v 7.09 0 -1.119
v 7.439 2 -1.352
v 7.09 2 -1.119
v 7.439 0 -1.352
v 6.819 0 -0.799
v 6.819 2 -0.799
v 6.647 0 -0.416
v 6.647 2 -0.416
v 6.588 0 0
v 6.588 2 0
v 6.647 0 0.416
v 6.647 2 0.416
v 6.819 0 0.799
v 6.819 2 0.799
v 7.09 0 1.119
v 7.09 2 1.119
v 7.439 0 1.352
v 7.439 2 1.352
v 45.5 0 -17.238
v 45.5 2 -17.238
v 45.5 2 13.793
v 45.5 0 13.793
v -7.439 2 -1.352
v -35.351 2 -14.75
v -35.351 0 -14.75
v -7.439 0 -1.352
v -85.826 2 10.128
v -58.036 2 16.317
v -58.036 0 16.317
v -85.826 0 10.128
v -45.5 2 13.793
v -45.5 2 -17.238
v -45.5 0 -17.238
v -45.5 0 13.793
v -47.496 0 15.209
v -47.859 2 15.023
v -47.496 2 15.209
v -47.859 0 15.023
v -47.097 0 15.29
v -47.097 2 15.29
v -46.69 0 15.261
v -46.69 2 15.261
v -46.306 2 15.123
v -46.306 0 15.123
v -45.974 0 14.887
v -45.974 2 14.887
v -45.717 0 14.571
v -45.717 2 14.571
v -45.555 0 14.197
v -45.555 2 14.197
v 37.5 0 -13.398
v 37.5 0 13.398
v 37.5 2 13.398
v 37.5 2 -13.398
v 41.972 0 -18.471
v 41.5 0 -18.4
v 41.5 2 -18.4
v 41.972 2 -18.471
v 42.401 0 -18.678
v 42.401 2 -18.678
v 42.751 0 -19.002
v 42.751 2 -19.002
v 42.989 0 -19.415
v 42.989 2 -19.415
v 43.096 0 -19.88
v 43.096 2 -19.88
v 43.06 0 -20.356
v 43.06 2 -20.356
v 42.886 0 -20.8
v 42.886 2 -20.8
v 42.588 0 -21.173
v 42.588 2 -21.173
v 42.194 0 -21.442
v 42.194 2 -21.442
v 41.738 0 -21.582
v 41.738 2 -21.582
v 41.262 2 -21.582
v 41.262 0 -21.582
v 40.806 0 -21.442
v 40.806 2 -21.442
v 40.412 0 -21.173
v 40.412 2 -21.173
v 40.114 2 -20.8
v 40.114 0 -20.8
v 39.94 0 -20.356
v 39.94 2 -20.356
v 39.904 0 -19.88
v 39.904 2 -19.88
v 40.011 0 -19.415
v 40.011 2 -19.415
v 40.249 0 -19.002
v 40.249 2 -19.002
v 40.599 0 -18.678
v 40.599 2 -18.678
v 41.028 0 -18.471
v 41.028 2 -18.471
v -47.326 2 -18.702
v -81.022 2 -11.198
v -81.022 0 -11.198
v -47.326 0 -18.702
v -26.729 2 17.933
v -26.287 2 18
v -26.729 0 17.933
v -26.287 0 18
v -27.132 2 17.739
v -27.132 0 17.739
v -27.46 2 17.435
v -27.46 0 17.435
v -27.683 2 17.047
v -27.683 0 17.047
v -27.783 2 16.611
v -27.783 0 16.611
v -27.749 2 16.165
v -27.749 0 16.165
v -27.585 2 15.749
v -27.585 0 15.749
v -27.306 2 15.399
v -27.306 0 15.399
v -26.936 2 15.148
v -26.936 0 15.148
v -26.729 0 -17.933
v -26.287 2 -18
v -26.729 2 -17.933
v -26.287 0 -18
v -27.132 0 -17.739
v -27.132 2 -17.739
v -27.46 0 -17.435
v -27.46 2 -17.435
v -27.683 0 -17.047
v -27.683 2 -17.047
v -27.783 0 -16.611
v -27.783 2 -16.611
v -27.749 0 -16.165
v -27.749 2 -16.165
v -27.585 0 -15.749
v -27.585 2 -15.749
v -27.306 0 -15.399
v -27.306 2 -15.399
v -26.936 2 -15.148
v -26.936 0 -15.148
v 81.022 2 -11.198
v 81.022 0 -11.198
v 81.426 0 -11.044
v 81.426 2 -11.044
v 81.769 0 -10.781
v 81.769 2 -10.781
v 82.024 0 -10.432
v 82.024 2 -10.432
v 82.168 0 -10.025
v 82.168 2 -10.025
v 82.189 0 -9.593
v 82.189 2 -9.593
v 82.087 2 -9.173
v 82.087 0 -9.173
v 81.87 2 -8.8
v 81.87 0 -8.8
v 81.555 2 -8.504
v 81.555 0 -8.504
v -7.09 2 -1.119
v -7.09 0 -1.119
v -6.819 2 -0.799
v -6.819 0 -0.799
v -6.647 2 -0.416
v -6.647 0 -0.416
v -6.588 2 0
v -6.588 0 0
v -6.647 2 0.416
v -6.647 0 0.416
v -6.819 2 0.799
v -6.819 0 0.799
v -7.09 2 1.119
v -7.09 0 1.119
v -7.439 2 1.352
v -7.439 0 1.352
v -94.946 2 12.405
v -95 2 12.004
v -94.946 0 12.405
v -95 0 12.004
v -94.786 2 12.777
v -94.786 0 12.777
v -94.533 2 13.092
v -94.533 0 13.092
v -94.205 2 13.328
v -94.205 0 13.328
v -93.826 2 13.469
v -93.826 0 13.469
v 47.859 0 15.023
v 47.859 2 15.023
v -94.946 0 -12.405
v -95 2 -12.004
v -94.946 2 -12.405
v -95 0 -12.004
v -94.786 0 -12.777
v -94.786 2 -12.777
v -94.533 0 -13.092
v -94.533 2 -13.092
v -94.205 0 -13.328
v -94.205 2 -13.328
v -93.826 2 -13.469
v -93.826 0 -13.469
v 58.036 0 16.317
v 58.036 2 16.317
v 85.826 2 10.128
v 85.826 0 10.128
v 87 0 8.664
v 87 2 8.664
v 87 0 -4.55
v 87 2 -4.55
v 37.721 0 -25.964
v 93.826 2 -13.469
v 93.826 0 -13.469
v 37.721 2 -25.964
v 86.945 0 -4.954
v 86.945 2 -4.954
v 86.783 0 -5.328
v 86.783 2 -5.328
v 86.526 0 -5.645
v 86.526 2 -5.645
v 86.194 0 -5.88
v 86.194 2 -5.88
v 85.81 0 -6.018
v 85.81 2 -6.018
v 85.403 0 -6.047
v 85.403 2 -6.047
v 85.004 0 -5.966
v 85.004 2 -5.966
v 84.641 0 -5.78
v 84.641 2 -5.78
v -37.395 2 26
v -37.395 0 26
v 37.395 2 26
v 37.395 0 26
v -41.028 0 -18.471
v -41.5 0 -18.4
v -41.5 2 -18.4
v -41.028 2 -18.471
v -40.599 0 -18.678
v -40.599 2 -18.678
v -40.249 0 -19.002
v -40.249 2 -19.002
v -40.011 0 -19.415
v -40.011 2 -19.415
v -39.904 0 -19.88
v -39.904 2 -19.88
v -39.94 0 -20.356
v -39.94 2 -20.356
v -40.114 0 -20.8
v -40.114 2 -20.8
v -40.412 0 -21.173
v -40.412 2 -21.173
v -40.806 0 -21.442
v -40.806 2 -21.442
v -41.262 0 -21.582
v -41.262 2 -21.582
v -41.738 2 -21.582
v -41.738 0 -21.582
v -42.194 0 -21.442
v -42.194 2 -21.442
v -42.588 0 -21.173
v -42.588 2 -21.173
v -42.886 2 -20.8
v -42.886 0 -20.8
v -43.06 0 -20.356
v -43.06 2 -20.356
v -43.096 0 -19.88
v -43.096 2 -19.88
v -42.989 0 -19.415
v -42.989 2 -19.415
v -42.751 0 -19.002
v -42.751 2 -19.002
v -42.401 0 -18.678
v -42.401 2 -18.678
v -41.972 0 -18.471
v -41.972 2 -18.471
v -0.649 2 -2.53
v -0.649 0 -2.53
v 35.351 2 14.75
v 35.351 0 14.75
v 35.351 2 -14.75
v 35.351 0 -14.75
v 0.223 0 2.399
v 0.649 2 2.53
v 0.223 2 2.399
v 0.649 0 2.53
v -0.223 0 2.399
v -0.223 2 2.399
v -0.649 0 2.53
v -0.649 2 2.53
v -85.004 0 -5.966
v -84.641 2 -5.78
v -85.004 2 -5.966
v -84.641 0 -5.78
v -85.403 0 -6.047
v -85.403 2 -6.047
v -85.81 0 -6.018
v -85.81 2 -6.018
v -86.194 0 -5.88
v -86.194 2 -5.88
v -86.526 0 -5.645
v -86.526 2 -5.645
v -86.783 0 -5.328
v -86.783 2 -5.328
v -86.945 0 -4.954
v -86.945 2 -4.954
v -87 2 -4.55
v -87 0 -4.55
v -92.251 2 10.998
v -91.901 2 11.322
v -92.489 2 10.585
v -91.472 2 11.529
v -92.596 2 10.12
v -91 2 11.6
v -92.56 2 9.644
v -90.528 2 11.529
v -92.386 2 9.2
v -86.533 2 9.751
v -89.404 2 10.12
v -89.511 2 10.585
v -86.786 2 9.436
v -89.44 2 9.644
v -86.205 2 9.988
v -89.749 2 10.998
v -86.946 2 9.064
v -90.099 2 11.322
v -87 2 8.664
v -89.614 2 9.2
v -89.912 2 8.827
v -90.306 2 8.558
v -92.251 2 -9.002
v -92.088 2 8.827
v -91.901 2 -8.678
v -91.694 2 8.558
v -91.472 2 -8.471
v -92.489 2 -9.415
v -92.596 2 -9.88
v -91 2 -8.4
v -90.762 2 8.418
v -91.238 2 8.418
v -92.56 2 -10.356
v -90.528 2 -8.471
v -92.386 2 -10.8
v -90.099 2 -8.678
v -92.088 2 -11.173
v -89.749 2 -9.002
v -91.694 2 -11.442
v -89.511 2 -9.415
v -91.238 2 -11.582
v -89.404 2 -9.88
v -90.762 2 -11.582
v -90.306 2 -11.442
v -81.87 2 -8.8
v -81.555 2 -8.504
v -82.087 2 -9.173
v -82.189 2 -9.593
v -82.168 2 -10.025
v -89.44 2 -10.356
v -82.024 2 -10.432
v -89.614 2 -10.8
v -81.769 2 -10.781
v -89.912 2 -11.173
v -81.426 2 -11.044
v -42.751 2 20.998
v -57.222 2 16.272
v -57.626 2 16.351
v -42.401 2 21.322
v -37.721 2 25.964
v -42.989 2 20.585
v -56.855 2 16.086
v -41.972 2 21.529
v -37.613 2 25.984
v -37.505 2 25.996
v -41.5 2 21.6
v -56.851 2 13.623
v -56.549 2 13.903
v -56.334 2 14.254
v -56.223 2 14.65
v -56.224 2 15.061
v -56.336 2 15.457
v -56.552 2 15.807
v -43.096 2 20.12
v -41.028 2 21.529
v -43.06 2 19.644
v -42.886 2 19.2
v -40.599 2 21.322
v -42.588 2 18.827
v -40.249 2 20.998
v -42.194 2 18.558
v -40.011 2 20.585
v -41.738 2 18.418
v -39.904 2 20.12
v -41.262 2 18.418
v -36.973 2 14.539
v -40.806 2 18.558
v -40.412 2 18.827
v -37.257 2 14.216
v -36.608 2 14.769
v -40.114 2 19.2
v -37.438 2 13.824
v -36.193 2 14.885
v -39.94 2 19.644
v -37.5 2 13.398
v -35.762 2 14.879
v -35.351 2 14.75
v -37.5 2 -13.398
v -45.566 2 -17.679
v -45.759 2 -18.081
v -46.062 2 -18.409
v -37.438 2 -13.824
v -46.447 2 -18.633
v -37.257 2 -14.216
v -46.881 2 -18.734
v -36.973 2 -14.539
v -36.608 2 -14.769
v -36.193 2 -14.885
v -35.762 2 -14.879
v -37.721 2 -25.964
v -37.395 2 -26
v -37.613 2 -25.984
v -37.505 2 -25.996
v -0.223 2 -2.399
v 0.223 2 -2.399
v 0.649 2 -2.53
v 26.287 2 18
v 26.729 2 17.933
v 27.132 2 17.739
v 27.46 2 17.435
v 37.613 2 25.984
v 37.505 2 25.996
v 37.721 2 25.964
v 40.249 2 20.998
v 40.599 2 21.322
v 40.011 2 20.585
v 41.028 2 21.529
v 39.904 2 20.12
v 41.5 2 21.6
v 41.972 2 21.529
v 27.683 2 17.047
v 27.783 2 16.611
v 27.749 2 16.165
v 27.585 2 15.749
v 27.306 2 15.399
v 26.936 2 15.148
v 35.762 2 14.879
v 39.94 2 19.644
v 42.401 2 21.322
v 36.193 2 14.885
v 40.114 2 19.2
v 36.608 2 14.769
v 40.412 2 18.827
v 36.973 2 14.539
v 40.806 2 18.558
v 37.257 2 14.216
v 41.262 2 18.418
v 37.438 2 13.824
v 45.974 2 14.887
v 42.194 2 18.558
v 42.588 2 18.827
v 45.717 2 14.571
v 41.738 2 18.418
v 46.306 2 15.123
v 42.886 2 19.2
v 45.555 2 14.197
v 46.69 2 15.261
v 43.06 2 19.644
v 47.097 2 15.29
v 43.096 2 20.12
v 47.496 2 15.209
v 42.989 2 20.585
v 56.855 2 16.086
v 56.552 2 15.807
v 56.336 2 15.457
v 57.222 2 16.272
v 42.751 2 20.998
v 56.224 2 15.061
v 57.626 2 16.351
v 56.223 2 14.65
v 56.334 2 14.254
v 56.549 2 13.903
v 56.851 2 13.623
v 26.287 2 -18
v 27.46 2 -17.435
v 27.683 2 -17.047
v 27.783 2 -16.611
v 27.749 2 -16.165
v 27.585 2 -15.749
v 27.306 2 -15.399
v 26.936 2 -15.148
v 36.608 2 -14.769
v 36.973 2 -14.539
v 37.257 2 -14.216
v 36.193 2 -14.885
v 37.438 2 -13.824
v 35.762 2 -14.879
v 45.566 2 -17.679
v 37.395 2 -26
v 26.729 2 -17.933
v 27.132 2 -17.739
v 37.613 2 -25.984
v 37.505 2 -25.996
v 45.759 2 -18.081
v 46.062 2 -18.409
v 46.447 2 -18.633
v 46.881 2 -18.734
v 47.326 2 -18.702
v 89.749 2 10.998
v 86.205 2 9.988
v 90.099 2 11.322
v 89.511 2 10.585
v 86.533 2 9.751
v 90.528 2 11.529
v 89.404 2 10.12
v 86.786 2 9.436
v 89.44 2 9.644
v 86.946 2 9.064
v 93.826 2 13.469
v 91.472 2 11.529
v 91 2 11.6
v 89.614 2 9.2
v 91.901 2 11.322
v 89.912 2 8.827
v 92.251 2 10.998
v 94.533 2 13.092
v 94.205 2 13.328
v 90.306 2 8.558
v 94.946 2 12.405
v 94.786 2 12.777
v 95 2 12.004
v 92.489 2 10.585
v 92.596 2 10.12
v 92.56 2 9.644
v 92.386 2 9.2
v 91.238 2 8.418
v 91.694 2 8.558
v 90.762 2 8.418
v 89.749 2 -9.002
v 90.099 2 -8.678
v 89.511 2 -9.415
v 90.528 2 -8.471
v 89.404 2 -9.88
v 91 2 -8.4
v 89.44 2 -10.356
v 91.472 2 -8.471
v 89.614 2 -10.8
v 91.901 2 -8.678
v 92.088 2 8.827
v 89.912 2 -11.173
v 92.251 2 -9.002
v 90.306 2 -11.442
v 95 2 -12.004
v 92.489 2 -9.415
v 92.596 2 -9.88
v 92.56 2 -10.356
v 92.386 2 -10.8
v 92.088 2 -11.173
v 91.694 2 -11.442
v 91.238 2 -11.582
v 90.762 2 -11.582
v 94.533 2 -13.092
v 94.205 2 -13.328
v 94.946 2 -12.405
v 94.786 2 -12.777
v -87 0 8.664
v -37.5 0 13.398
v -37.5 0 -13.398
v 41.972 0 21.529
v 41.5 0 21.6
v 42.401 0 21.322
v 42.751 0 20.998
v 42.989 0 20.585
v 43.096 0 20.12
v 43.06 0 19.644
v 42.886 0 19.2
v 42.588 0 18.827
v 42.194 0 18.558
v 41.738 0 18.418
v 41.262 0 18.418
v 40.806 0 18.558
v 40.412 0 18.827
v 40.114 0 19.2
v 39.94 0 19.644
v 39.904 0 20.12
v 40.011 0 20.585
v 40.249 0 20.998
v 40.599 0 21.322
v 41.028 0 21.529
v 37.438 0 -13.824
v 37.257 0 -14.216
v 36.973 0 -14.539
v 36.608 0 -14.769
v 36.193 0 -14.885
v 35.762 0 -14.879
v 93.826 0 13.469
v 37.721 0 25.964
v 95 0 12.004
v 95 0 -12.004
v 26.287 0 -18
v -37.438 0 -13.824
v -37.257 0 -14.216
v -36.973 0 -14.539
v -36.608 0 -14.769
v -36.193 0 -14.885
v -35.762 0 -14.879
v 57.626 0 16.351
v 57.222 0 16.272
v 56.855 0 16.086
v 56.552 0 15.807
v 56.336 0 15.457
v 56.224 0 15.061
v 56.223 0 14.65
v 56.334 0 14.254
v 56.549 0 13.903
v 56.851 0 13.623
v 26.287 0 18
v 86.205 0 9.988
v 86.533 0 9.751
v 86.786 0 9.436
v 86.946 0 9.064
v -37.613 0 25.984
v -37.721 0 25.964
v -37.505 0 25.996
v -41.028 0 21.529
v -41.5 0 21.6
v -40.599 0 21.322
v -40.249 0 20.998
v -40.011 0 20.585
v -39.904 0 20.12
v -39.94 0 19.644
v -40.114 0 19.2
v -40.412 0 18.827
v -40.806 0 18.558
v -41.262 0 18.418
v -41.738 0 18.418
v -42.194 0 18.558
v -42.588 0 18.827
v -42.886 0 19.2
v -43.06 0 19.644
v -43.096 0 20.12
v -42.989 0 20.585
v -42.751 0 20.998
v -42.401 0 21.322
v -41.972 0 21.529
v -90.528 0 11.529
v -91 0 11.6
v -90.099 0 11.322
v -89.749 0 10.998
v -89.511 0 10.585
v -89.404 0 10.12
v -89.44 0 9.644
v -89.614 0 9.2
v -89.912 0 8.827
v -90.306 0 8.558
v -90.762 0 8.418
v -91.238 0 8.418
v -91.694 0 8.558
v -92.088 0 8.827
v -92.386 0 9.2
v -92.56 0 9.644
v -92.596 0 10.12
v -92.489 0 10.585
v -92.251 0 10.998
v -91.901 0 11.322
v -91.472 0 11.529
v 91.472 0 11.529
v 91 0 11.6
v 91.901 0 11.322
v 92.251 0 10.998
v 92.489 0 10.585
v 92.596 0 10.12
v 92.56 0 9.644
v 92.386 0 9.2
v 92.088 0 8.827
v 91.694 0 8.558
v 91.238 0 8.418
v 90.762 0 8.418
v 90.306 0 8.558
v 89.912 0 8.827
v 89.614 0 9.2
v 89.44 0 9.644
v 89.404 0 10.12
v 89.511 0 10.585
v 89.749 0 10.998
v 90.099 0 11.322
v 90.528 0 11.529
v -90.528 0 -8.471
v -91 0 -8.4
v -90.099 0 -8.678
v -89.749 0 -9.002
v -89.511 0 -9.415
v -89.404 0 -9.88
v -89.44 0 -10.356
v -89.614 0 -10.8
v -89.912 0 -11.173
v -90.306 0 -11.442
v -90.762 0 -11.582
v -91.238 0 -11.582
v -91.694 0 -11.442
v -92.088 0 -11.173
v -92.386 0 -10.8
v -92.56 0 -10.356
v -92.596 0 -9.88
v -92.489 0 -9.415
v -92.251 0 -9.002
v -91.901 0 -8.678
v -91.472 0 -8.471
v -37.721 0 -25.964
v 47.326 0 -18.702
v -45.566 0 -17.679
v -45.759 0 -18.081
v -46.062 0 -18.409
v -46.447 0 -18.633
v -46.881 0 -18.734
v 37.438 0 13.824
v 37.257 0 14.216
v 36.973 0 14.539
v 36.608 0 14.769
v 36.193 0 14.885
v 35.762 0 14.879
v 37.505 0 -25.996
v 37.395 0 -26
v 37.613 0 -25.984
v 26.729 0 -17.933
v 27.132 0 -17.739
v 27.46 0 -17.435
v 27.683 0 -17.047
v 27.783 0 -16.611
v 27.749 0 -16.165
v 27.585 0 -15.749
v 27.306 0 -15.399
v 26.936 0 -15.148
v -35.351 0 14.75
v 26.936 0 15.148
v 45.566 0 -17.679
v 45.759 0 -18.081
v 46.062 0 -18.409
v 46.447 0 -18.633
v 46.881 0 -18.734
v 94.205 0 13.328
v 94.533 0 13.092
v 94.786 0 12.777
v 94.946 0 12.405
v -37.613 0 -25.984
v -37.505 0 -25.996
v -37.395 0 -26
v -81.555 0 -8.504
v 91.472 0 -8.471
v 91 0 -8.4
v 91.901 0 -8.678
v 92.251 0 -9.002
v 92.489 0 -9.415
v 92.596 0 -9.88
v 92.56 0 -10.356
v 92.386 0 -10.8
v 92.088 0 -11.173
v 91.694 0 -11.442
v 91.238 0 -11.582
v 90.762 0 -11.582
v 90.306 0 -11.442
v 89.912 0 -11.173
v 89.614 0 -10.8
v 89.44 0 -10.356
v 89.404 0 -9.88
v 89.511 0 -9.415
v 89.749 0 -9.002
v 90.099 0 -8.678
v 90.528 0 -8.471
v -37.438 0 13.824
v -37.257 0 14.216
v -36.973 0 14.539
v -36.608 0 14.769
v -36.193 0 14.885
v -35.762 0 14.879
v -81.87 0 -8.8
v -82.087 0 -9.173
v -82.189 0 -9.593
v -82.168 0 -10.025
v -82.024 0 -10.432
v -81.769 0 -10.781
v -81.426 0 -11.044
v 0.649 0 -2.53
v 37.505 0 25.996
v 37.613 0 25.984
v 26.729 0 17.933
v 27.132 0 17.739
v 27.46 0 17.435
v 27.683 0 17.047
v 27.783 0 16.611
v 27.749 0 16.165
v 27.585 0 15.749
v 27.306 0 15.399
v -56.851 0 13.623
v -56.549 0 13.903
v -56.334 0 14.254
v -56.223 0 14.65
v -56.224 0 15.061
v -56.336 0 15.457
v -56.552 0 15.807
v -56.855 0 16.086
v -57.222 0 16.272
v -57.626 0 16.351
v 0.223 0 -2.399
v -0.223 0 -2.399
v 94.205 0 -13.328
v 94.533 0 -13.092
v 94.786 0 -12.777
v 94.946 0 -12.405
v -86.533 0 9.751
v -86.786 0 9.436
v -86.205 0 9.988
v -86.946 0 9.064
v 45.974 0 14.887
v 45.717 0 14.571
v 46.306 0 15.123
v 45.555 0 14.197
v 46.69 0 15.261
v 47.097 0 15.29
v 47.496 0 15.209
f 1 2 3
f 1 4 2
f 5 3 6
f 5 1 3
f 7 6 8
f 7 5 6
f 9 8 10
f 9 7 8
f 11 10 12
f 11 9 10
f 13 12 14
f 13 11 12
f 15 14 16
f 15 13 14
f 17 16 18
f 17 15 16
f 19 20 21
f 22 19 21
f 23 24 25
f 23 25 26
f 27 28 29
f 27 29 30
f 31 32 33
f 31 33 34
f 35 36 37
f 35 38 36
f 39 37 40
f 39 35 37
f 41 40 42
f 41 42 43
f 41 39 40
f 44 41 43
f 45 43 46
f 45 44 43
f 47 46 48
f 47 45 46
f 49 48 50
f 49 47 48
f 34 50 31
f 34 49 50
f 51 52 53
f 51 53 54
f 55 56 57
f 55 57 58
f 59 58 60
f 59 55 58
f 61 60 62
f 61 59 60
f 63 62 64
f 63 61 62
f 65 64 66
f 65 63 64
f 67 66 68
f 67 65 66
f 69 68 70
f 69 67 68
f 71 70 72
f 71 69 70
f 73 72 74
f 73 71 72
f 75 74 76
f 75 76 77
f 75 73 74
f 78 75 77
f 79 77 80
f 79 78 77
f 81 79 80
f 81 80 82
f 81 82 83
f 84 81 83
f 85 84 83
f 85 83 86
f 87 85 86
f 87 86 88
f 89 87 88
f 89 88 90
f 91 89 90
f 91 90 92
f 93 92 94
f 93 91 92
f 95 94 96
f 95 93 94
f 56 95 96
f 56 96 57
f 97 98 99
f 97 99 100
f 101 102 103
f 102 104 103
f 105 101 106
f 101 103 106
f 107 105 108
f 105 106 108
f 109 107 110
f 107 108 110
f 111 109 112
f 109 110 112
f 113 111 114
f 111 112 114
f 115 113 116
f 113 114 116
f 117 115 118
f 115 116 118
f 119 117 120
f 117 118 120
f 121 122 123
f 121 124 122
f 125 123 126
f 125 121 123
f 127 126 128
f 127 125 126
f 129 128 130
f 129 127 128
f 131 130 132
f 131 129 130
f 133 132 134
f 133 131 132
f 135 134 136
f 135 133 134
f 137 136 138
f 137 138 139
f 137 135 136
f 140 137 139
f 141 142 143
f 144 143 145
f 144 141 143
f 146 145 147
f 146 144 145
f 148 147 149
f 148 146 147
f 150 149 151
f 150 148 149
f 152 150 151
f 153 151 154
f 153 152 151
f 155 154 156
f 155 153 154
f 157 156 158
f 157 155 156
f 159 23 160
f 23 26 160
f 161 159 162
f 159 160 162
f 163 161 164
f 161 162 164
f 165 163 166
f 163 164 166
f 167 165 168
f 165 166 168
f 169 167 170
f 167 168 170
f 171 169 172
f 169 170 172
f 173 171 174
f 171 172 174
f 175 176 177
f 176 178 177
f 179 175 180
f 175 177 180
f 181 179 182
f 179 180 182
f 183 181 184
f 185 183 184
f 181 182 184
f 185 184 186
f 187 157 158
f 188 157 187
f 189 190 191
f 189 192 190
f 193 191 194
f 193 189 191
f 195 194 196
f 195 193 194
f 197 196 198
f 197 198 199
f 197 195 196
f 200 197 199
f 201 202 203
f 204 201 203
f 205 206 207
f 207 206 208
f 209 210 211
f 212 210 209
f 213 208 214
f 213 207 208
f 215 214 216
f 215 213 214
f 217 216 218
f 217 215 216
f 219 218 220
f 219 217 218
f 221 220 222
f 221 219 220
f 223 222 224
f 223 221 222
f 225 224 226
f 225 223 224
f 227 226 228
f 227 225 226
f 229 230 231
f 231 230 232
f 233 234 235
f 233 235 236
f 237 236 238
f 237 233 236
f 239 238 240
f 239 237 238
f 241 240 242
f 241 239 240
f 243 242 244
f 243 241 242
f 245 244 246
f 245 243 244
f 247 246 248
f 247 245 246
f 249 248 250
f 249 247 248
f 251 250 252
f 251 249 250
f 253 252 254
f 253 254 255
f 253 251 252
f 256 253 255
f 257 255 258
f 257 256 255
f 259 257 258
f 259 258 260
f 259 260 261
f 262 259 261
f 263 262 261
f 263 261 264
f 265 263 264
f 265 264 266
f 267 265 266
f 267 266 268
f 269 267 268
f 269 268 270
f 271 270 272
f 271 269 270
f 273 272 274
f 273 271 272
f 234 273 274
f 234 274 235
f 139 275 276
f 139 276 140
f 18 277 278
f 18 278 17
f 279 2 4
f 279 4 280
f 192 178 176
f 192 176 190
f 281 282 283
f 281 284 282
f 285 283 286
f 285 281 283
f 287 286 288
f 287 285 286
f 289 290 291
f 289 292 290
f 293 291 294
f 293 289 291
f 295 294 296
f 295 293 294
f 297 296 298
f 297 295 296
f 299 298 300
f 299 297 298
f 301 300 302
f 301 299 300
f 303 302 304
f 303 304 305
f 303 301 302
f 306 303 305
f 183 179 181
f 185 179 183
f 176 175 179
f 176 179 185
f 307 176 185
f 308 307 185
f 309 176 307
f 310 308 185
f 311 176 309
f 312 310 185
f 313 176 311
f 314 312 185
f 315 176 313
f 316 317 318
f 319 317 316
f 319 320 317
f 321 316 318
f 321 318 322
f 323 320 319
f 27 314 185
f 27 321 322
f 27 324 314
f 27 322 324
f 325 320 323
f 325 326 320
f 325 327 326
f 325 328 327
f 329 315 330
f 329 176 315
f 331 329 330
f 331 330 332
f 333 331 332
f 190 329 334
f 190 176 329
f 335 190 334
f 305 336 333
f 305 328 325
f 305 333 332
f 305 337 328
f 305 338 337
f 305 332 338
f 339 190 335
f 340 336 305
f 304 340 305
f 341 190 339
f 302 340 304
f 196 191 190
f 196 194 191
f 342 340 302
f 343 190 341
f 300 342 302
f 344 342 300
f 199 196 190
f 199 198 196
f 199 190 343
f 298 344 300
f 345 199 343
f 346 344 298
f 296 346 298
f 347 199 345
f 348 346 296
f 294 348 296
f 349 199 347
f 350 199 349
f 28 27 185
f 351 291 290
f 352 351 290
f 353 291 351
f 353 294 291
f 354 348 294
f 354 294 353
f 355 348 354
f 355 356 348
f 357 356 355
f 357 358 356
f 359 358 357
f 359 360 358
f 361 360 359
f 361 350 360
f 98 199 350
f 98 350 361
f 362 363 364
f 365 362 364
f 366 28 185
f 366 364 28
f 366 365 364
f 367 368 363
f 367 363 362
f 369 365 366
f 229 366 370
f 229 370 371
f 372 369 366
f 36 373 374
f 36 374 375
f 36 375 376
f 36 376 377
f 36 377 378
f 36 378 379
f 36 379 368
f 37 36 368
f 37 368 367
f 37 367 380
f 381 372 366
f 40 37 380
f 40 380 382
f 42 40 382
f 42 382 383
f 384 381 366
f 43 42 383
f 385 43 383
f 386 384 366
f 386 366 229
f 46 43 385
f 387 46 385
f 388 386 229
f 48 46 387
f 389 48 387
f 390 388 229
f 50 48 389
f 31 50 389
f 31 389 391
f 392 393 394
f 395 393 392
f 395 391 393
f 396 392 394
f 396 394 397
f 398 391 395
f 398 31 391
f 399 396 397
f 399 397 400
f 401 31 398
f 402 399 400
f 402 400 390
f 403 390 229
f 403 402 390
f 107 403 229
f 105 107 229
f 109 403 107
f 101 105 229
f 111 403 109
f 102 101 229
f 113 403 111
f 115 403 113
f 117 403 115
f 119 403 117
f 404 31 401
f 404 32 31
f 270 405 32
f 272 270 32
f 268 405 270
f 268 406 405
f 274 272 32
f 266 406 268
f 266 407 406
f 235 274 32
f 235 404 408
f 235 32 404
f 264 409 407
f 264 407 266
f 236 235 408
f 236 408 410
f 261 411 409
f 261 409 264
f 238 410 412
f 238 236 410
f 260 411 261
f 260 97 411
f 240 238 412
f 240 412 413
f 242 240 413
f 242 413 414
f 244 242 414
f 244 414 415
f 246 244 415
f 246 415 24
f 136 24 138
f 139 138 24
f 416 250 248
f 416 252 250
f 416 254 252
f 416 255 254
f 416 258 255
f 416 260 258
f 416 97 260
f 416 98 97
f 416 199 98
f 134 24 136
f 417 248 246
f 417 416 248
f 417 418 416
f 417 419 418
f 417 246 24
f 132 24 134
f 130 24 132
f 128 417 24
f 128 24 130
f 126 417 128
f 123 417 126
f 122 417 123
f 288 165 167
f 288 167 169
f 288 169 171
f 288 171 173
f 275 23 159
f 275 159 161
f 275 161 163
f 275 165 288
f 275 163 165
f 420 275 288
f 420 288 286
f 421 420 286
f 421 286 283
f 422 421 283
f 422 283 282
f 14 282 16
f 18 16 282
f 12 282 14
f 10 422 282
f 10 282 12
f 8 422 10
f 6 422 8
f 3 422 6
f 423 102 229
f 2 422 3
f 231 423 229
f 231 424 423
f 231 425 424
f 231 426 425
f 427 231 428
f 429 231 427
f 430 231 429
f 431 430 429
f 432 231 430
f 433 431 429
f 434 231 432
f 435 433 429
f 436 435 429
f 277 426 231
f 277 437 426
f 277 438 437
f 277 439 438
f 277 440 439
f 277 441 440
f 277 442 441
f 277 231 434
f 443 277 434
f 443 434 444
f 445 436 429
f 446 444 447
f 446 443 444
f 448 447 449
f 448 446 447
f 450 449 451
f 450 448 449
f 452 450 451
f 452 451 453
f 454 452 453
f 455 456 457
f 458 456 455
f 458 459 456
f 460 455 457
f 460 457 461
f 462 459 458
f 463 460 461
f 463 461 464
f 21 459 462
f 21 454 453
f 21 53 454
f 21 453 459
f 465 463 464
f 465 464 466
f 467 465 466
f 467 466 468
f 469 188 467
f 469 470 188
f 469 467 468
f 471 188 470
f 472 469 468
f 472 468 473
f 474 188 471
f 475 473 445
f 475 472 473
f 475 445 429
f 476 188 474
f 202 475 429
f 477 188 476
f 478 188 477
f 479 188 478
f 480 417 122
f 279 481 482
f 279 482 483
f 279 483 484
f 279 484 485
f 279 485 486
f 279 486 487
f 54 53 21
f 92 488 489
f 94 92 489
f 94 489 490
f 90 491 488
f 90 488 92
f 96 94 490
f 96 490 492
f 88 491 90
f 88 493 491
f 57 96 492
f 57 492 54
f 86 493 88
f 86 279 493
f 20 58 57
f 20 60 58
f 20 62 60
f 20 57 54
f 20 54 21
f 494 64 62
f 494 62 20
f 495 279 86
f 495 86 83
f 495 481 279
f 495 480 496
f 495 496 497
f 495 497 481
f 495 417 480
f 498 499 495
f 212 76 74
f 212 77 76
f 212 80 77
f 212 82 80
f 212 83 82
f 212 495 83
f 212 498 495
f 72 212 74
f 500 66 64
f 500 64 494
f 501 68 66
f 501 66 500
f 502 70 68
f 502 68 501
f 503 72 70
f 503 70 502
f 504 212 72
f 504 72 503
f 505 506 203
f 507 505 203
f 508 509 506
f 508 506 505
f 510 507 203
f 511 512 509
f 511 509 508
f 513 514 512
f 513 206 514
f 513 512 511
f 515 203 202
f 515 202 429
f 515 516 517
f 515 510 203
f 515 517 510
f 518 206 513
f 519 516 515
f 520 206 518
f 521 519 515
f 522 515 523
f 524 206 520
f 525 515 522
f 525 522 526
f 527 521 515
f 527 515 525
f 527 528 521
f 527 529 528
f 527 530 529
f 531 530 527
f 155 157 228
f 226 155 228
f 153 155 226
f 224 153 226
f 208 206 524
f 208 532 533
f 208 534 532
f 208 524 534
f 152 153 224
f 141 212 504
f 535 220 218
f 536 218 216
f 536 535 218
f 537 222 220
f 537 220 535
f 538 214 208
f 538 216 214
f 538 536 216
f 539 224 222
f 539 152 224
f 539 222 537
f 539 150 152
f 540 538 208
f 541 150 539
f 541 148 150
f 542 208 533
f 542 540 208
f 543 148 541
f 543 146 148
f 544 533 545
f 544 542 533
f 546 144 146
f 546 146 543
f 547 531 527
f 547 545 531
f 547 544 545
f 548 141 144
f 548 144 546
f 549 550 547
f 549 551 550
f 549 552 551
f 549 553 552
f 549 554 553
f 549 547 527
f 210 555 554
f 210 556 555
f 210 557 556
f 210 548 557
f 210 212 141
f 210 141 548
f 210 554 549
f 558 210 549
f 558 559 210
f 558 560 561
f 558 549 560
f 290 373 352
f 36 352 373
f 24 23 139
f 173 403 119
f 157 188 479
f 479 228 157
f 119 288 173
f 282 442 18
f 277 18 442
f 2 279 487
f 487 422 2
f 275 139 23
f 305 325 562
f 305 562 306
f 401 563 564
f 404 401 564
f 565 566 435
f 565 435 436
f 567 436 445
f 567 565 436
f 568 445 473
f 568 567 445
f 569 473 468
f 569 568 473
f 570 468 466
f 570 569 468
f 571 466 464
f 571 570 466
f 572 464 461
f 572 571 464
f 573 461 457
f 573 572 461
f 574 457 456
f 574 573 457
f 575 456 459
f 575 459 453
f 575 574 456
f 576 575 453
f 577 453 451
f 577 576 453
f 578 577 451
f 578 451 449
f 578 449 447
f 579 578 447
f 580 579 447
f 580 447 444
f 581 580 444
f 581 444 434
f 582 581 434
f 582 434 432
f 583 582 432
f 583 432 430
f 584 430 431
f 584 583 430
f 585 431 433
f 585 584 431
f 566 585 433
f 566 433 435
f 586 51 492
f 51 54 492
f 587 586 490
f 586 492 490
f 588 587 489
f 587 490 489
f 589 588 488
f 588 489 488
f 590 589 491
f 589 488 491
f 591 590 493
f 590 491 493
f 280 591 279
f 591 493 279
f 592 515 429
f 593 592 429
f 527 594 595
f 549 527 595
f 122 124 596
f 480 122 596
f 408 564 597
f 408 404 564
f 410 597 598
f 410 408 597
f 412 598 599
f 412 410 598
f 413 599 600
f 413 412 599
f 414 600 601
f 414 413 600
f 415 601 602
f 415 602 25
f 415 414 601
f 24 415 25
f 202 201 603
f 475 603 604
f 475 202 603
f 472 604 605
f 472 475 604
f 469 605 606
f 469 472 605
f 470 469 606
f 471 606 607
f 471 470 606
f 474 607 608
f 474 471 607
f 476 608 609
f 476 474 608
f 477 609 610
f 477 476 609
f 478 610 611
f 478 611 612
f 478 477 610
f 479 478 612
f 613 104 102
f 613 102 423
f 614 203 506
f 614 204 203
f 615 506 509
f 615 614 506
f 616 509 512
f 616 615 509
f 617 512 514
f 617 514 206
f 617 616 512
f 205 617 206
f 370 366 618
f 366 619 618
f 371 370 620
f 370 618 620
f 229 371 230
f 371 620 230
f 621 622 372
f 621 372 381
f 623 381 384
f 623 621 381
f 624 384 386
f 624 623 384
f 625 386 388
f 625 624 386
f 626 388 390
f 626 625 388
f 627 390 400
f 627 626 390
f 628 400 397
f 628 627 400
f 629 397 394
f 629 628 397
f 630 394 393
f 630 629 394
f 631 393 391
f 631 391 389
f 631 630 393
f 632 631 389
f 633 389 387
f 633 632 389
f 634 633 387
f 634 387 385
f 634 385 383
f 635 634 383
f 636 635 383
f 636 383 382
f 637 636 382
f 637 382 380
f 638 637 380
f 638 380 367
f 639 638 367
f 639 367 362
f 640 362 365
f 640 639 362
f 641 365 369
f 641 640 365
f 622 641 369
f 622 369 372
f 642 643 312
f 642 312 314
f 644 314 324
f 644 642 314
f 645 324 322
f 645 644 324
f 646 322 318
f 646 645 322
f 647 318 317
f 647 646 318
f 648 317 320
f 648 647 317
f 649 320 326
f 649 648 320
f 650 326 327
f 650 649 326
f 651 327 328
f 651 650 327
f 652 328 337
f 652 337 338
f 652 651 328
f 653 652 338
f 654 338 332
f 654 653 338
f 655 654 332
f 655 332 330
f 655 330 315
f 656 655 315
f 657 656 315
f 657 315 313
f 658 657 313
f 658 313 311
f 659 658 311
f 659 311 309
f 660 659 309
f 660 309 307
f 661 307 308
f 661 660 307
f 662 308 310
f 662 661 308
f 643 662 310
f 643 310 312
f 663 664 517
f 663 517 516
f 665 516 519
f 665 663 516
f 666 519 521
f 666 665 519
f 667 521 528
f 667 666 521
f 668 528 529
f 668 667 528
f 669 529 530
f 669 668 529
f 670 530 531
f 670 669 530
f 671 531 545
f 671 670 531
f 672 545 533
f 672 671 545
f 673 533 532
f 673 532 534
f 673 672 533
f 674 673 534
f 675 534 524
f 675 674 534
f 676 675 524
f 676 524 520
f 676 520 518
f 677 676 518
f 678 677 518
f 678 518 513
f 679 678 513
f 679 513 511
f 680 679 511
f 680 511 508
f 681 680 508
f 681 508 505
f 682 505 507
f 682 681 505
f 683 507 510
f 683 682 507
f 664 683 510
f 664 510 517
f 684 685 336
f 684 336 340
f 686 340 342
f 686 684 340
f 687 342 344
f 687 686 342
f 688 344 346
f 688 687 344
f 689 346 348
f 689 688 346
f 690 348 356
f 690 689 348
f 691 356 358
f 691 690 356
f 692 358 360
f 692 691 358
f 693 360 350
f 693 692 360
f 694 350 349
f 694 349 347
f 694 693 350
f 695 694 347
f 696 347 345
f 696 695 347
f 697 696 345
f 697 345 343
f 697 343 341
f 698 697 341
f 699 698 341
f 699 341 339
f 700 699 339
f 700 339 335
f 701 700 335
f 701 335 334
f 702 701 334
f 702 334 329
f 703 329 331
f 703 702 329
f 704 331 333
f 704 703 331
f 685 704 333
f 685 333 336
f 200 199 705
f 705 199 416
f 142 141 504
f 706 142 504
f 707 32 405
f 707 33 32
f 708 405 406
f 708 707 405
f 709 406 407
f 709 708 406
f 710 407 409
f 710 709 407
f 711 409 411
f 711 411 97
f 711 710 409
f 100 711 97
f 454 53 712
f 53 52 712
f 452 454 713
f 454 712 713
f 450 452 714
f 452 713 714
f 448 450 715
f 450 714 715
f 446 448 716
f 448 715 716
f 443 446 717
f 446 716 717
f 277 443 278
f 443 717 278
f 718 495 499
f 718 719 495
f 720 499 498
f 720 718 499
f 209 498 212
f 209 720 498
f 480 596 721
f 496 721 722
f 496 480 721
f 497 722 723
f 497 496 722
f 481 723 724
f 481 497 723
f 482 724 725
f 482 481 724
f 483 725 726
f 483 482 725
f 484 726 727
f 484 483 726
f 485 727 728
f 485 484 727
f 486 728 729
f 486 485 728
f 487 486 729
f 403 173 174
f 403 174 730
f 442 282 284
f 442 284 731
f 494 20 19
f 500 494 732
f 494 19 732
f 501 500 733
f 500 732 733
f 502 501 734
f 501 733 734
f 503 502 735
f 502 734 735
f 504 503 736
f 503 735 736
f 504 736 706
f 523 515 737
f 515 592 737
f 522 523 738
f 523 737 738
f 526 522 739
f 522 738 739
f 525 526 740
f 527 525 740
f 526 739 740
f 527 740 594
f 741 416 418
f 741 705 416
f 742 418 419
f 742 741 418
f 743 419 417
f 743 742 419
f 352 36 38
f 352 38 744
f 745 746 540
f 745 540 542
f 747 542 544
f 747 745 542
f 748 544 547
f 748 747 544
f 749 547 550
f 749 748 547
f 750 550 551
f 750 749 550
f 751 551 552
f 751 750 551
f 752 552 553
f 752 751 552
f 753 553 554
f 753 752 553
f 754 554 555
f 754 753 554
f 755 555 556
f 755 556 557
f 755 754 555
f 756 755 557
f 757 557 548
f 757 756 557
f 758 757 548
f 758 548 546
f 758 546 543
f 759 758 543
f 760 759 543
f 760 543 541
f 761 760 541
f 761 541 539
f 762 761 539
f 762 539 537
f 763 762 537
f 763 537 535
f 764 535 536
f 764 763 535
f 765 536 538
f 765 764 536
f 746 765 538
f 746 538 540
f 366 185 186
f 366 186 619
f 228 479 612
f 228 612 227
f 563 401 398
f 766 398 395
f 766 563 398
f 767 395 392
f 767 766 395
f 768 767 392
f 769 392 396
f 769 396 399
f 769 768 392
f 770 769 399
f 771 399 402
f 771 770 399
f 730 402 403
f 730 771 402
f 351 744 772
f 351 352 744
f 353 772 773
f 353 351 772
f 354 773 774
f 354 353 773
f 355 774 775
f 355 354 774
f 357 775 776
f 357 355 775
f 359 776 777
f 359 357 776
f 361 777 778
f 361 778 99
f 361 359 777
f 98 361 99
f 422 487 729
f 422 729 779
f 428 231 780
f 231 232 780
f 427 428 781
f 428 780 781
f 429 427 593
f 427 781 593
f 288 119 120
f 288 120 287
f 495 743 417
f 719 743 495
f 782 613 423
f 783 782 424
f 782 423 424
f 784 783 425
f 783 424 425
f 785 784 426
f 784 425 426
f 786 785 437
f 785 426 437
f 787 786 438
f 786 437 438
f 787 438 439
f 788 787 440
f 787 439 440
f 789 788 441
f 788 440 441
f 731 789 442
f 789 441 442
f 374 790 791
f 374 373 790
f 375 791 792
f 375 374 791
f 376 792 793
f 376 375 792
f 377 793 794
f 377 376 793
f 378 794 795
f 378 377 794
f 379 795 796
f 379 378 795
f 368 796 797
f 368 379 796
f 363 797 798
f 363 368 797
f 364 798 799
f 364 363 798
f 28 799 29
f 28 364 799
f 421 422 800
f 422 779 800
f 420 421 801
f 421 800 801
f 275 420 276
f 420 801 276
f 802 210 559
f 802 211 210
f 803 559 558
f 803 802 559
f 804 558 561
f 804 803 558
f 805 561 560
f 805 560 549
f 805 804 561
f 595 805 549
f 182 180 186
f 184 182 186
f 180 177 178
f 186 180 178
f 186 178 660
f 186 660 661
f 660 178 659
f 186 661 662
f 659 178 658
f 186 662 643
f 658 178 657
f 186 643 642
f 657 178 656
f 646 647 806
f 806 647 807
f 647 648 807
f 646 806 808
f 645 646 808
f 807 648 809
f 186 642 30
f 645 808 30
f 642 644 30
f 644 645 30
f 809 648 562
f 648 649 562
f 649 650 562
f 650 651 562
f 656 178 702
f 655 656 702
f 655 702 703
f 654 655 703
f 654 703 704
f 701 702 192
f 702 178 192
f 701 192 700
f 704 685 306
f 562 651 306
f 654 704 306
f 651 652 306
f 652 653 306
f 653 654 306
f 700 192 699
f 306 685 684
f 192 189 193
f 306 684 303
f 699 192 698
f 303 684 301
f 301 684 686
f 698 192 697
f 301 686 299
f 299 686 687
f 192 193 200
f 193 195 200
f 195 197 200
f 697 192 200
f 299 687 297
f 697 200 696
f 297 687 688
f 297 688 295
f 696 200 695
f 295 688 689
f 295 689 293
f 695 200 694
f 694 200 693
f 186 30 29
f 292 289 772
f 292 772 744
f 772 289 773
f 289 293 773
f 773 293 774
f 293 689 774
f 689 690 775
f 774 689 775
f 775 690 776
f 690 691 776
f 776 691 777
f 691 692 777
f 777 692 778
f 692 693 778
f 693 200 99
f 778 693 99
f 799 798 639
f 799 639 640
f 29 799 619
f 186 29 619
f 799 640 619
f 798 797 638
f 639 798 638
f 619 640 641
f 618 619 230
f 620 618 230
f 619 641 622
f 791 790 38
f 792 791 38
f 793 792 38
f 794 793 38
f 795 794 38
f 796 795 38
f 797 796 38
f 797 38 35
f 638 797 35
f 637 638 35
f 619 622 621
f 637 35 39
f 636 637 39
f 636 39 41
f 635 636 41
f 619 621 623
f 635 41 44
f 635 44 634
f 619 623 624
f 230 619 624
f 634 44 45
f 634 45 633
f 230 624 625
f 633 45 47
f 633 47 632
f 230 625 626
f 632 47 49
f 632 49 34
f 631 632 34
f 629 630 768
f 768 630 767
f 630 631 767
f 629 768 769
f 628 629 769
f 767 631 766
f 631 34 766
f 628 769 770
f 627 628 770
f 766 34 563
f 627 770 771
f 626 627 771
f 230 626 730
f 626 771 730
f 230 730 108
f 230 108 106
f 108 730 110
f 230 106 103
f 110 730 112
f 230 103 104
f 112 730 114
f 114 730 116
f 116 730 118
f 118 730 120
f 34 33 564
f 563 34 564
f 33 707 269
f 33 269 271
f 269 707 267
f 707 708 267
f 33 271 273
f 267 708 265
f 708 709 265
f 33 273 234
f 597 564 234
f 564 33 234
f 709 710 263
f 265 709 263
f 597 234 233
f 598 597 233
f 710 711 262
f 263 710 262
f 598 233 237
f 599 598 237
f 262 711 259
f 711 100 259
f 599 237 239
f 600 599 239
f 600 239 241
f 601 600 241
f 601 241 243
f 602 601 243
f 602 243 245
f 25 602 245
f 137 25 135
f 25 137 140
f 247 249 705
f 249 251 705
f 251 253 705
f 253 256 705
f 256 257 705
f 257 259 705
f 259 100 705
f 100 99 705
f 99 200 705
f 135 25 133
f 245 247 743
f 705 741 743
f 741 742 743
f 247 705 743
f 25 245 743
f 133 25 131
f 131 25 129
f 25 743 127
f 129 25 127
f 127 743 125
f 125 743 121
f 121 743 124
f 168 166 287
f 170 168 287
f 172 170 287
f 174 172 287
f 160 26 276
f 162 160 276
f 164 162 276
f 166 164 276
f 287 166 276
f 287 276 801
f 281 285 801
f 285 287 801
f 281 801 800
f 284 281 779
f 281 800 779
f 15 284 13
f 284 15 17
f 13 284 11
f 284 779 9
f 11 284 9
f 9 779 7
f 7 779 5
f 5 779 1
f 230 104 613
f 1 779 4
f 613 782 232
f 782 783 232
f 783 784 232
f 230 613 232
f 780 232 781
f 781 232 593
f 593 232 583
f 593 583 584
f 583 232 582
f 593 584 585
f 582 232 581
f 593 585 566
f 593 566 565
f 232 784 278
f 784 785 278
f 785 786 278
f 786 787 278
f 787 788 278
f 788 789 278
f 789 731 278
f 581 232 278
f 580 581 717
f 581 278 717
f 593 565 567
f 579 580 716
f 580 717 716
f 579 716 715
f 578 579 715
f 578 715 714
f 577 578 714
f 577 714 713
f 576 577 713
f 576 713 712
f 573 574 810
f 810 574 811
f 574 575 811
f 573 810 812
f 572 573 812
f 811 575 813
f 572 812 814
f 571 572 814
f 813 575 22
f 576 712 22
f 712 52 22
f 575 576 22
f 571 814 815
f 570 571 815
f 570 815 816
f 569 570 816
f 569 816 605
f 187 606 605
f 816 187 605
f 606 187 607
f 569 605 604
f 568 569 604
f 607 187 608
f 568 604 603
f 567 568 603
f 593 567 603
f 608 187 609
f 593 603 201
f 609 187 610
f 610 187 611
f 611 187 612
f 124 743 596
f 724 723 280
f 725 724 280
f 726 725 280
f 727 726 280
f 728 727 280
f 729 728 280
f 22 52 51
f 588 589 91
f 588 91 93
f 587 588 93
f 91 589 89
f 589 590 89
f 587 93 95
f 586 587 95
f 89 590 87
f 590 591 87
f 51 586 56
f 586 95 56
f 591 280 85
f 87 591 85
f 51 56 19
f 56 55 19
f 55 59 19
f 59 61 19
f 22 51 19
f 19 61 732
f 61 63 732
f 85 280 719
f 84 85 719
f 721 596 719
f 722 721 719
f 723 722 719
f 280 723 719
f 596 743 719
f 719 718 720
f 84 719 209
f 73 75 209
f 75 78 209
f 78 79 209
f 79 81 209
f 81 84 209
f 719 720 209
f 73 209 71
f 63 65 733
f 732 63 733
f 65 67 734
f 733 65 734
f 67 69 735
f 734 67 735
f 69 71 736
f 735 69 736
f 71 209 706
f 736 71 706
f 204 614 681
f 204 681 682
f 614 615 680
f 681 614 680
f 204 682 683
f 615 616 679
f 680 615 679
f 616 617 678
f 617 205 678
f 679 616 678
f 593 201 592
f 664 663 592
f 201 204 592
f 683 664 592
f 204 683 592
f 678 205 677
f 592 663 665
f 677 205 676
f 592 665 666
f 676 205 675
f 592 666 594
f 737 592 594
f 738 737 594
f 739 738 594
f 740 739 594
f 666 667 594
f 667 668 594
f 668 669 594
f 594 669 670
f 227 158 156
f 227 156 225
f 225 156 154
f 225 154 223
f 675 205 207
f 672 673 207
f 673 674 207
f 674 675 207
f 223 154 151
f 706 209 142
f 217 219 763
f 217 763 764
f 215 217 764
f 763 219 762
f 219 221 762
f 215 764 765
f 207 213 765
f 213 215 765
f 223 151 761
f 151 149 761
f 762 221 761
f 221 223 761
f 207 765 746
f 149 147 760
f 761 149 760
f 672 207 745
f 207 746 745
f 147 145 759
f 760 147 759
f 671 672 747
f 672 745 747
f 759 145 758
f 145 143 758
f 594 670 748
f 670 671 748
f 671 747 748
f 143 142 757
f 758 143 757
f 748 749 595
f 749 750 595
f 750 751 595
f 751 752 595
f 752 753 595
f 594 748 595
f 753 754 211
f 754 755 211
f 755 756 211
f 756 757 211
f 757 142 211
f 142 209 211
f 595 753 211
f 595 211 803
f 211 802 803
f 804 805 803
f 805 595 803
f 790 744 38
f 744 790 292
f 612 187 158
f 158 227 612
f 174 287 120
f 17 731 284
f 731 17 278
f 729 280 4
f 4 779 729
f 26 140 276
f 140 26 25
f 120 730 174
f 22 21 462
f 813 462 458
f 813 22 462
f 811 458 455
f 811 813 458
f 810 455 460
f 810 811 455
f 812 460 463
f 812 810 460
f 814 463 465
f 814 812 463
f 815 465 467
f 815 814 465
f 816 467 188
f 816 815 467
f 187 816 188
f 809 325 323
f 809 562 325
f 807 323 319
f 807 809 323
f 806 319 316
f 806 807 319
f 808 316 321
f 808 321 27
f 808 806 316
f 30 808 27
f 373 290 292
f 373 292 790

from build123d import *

# Parameters (mm, degrees)
SKETCH_1_W          = 190
SKETCH_1_H          = 52
SKETCH_1_R          = 1.6
SKETCH_1_W_2        = 75
SKETCH_1_H_2        = 36
EXTRUDE_1_DEPTH     = 2
CUT_EXTRUDE_1_DEPTH = 2
EXTRUDE_1_2_DEPTH   = 2
FILLET_1_R          = 1.5


with BuildPart() as part:
    # 草图1 → Extrude 1 (new body)
    with BuildSketch(Plane(origin=(0, 0, 0), x_dir=(1, 0, 0), z_dir=(0, 1, 0))):
        Rectangle(SKETCH_1_W, SKETCH_1_H)
        with Locations(Location((91, -10, 0), (0, 0, 270))):
            Circle(SKETCH_1_R, mode=Mode.SUBTRACT)
        with Locations(Location((91, 10, 0), (0, 0, 270))):
            Circle(SKETCH_1_R, mode=Mode.SUBTRACT)
        with Locations(Location((-91, 10, 0), (0, 0, 270))):
            Circle(SKETCH_1_R, mode=Mode.SUBTRACT)
        with Locations(Location((-91, -10, 0), (0, 0, 270))):
            Circle(SKETCH_1_R, mode=Mode.SUBTRACT)
        with Locations(Location((41.5, -20, 0), (0, 0, 270))):
            Circle(SKETCH_1_R, mode=Mode.SUBTRACT)
        with Locations(Location((-41.5, -20, 0), (0, 0, 270))):
            Circle(SKETCH_1_R, mode=Mode.SUBTRACT)
        with Locations(Location((-41.5, 20, 0), (0, 0, 270))):
            Circle(SKETCH_1_R, mode=Mode.SUBTRACT)
        with Locations(Location((41.5, 20, 0), (0, 0, 270))):
            Circle(SKETCH_1_R, mode=Mode.SUBTRACT)
        Rectangle(SKETCH_1_W_2, SKETCH_1_H_2, mode=Mode.SUBTRACT)
    extrude(amount=EXTRUDE_1_DEPTH)

    # 草图2 → 切除-拉伸1 (cut)
    with BuildSketch(Plane(origin=(0, 2, 0), x_dir=(1, 0, 0), z_dir=(0, 1, 0))):
        Polygon((95, 13.207136478), (37.560055456, 26), (95, 26), align=None)
        Polygon((37.560055456, -26), (95, -26), (95, -13.207136478), align=None)
        Polygon((-95, -26), (-95, -13.207136478), (-37.560055456, -26), align=None)
        Polygon((-95, 26), (-95, 13.207136478), (-37.560055456, 26), align=None)
        Polygon((45.5, 19.109131207), (45.5, -19.109131207), (87, -9.866367475), (87, 9.866367475), align=None)
        Polygon((-87, -9.866367475), (-87, 9.866367475), (-45.5, 19.109131207), (-45.5, -19.109131207), align=None)
    extrude(amount=-CUT_EXTRUDE_1_DEPTH, mode=Mode.SUBTRACT)

    # 草图3 → Extrude 1 2 (add)
    with BuildSketch(Plane(origin=(0, 2, 0), x_dir=(1, 0, 0), z_dir=(0, 1, 0))):
        Polygon((-44.355051898, -17.46928553), (-85.855051898, 11.506213152), (-88.144948102, 8.226521799), (-46.644948102, -20.748976883), align=None)
        Polygon((36.634537865, 19.803046115), (-38.365462135, -16.196953885), (-36.634537865, -19.803046115), (38.365462135, 16.196953885), align=None)
        Polygon((-38.365462135, 16.196953885), (36.634537865, -19.803046115), (38.365462135, -16.196953885), (-36.634537865, 19.803046115), align=None)
        Polygon((46.644948102, -20.748976883), (88.144948102, 8.226521799), (85.855051898, 11.506213152), (44.355051898, -17.46928553), align=None)
    extrude(amount=-EXTRUDE_1_2_DEPTH)

    # 圆角1
    fillet_1_edges = [part.edges().sort_by_distance(p)[0] for p in [
        (-87, 1, 9.866367475),
        (-45.5, 1, -19.109131207),
        (95, 1, -13.207136478),
        (37.560055456, 1, -26),
        (-45.5, 1, 16.669877284),
        (-87, 1, -7.427113552),
        (-50.630005448, 1, 17.966590766),
        (-84.351291466, 1, -10.456280419),
        (32.878191792, 1, 18),
        (-32.878191792, 1, 18),
        (-37.5, 1, -15.78153206),
        (-37.5, 1, 15.78153206),
        (-32.878191792, 1, -18),
        (32.878191792, 1, -18),
        (37.5, 1, 15.78153206),
        (37.5, 1, -15.78153206),
        (0, 1, -2.21846794),
        (0, 1, 2.21846794),
        (4.621808208, 1, 0),
        (-4.621808208, 1, 0),
        (45.5, 1, 16.669877284),
        (50.630005448, 1, 17.966590766),
        (87, 1, -7.427113552),
        (84.351291466, 1, -10.456280419),
        (45.5, 1, -19.109131207),
        (87, 1, 9.866367475),
        (-37.560055456, 1, -26),
        (-95, 1, -13.207136478),
        (-37.560055456, 1, 26),
        (-95, 1, 13.207136478),
        (37.560055456, 1, 26),
        (95, 1, 13.207136478),
    ]]
    fillet(fillet_1_edges, radius=FILLET_1_R)


solid = part.part
